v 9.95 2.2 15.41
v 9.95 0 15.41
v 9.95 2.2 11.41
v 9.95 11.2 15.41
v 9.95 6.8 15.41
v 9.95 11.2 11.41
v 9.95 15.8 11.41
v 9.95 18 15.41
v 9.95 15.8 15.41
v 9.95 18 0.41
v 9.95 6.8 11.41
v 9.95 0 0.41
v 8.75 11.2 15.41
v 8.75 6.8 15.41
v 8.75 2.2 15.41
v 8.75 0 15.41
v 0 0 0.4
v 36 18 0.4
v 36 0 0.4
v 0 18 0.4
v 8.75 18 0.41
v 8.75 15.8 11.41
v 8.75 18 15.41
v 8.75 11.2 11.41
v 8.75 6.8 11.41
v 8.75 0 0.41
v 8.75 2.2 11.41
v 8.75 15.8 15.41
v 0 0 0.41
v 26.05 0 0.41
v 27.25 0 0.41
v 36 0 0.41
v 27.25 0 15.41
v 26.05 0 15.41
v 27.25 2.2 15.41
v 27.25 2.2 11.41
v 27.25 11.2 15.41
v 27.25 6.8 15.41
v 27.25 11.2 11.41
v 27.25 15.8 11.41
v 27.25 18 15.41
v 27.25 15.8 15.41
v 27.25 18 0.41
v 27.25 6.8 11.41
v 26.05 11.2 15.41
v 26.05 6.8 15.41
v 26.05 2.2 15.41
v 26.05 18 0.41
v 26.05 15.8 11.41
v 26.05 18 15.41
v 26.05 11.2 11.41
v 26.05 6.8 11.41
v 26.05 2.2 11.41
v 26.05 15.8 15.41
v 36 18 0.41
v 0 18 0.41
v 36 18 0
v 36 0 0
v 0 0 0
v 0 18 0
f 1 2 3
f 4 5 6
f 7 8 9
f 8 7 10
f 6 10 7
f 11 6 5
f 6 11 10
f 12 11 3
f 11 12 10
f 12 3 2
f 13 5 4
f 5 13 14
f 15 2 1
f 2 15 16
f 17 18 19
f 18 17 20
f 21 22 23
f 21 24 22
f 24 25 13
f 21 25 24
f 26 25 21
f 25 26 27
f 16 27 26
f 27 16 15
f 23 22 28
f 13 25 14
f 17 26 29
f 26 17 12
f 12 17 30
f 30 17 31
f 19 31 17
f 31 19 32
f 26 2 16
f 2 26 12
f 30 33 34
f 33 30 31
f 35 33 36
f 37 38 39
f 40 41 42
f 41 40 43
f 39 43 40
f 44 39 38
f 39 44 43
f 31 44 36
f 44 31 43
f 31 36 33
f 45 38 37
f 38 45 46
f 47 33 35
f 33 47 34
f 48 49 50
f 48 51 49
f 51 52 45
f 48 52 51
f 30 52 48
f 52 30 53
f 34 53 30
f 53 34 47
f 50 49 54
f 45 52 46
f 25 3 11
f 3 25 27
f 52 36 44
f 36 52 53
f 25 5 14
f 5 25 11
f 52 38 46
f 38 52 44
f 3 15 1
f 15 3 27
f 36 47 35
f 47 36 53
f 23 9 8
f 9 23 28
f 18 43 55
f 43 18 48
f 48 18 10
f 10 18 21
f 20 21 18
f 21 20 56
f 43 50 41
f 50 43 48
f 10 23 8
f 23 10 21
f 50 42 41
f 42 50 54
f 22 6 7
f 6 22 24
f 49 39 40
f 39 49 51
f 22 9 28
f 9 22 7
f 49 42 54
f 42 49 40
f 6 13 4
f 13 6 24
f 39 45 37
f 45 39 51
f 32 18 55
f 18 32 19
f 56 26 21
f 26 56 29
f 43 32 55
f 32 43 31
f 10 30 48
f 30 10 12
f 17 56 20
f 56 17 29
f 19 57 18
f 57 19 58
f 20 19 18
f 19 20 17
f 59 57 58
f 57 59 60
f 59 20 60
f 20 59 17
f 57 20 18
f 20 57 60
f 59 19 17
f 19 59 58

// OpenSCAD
// file: ../../Base/Helper.scad
// Fischertechnik Box Foundation
// Helper functions

include <PlacementOptions.scad>

// getRotation(rotations, i)
// gets the rotation with index i, even if rotations or rotations[i] is undefined.
// If undefined, NoRotation ist returned.
// rotations = list of Rotate-constants
// i = Index of the rotation
function getRotation(rotations, i) = (is_undef(rotations) || is_undef(rotations[i])) ? NoRotation : rotations[i];
// file: ../../Base/Boxes.scad
// Fischertechnik Box Foundation
// Pre-designed Boxes

use <Constants.scad>

include <PlacementOptions.scad>

box190Width = 190;
box190Depth = 130;
box130Width = 130;
box130Depth = 95;

// Values are from an original ec3 box
topBottomDifference = 1.5;
outerHeight = 40;
innerHeight = 38.2;
baseThickness = outerHeight - innerHeight;
stackExcess = 5.7;
radius = 3.5;
wallThickness = 1.5;
tolerance = 0.2;
stackOffset = innerHeight - stackExcess;

boxUsageHeight = stackOffset;
boxWallThickness = wallThickness;
boxBaseThickness = baseThickness;
boxWebWidth = 3.0;

// getBoxWallThickness()
// Gets the wall thickness of a Fischertechnik Box
function getBoxWallThickness() = boxWallThickness;

// getBoxUsageHeight()
// Gets the usable height of a Fischertechnik box
function getBoxUsageHeight() = boxUsageHeight;

// getBoxInnerHeight()
// Gets the inner height of a Fischertechnik box, including the stack excess
function getBoxInnerHeight() = innerHeight;

// getBoxBaseThickness()
// Gets the thickness of the Fischertechnik box base.
function getBoxBaseThickness() = boxBaseThickness;

// getBoxWebWidth()
// Gets the width of a box web
function getBoxWebWidth() = boxWebWidth;

// getBox190Space()
// Gets the usable inner space of a Box 190 as an x/y-list
function getBox190Space() = [
    box190Width - 2*getBoxWallThickness() - topBottomDifference, 
    box190Depth - 2*getBoxWallThickness() - topBottomDifference ];

// BoxBase(width, depth)
// Creates an empty stackable Fischertechnik compatible box
// width = Outer width of the box (190, 130, ...)
// depth = Outer depth of the box (130, 95, ...)

module BoxBase(width, depth, height=outerHeight) {    
    thinPlate = 0.01;

    innerHeight = height - baseThickness;    
    
    module BodyPlate(width, depth) {
        translate([radius, radius])
        hull() {
            w = width-2*radius;
            d = depth-2*radius;
            cube([w, d, thinPlate]);
            cylinder(thinPlate, r=radius, $fn=getFragments());
            translate([w, 0])
                cylinder(thinPlate, r=radius, $fn=getFragments());
            translate([w, d])
                cylinder(thinPlate, r=radius, $fn=getFragments());
            translate([0, d])
                cylinder(thinPlate, r=radius, $fn=getFragments());
        }
    }
    
    module Body(tolerance=tolerance) {
        hull() {
            // Bottom with tolerance to fit into the original boxes when stacked
            translate([-wallThickness+tolerance, -wallThickness+tolerance, -baseThickness])
                BodyPlate(width-topBottomDifference-2*tolerance, depth-topBottomDifference-2*tolerance);
            
            // Top
            translate([-wallThickness-topBottomDifference/2, -wallThickness-topBottomDifference/2, innerHeight-thinPlate])
                BodyPlate(width, depth);
         }
    }

    module Cutoff() {
        hull() {
            coWidth = width - 2*wallThickness;
            coDepth = depth - 2*wallThickness;
            
            // Bottom
            BodyPlate(coWidth-topBottomDifference, coDepth-topBottomDifference);

            // Top
            translate([-topBottomDifference/2, -topBottomDifference/2, innerHeight+thinPlate]) 
                BodyPlate(coWidth, coDepth);
        }
    }
    
    difference() {        
        Body();
        Cutoff();
        stackOffset = innerHeight - stackExcess;
        translate([0, 0, stackOffset + baseThickness])
            Body(tolerance=0);
    }
}

// Creates the Fischertechnik empty box 130x190 mm and places it at position 0,0
// 190x130 are the outer sizes, the inner space is slightly smaller. Use getBox190Space() to get the inner sizes.
// The box is positioned that the usable inner space is at the 0,0,0 position. The

module Box190() {
    BoxBase(box190Width, box190Depth);
}

// Gets the usable inner space of a Box 130 as an x/y-list
function getBox130Space() = [
    box130Width - 2*getBoxWallThickness() - topBottomDifference, 
    box130Depth - 2*getBoxWallThickness() - topBottomDifference ];

// Creates the Fischertechnik empty box 95x130 mm and places it at position 0,0
// 190x130 are the outer sizes, the inner space is slightly smaller. Use getBox190Space() to get the inner sizes.
// The box is positioned that the usable inner space is at the 0,0,0 position. The

module Box130() {
    BoxBase(box130Width, box130Depth);
}

// Creates a web at the specified box walls
// corner 0 = LowerLeft, 1 = UpperLeft, 2 = UpperRight, 3 = LowerRight
// side 0 = LeftOfCorner, 1 = RightOfCorner
// distance = Distance in mm from the corner
// boxSpace = inner width and depth of the box (default: Box 190)
// webWidth = length of the web (default is 3 mms)
// webThickness = thickness of the web (default is 1 mm)

module BoxWeb(corner, side, distance, boxSpace=getBox190Space(), webWidth=getBoxWebWidth(), webThickness=1.0) {
    sink = getBoxWallThickness()/2;

    width = (corner % 2 == 0) ? 
            (side == LeftOfCorner ? webWidth : webThickness) :
            (side == LeftOfCorner ? webThickness : webWidth);

    depth = (corner % 2 == 0) ? 
            (side == RightOfCorner ? webWidth : webThickness) :
            (side == RightOfCorner ? webThickness : webWidth);
    
    xDiff = corner == LowerLeft ? 
                (side == LeftOfCorner ? -sink : distance) :
            (corner == UpperLeft ?                
                (side == LeftOfCorner ? distance : -sink) :
            (corner == UpperRight ?
                (side == LeftOfCorner ? boxSpace.x-webWidth+sink : boxSpace.x-distance-webThickness) :
                (side == LeftOfCorner ? boxSpace.x-distance-webThickness: boxSpace.x-webWidth+sink)));

    yDiff = corner == LowerLeft ? 
                (side == RightOfCorner ? -sink : distance) :
            (corner == UpperLeft ?
                (side == RightOfCorner ? boxSpace.y-distance : boxSpace.y-webWidth+sink) :
            (corner == UpperRight ?
                (side == RightOfCorner ? boxSpace.y-webWidth+sink : boxSpace.y-distance) :
                (side == RightOfCorner ? distance : -sink)));
    
    translate([xDiff, yDiff, -getExcess()])
        cube([width, depth, boxUsageHeight + 2*getExcess()]);
}
// file: ../../Base/Rotation.scad
// Fischertechnik Box Foundation
// Geometry Helpers Rotation

include <PlacementOptions.scad>

// getRotatedSpace(space, rotation=NoRotation)
// Rotates the space dependent on the specified rotation

function getRotatedSpace(space, rotation=NoRotation) = [
    (rotation == Rotate90 || rotation == Rotate270) ? space.y : space.x,
    (rotation == Rotate90 || rotation == Rotate270) ? space.x : space.y
];

// Rotates the given space around the fixed left lower corner
// space = the space the children needs as width/depth list [width,depth]
// rotation = 0 Rotate0 degrees, 1 Rotate90 degrees, 2 Rotate180 degrees, 3 Rotate270 degrees (equivalent to -90)

module RotateFix(space, rotation=NoRotation) {
    dy = (rotation == Rotate0 || rotation == Rotate270) ? 0 :
        (rotation == Rotate90) ? space.x :
        space.y;
    dx = (rotation < Rotate180) ? 0 :
        (rotation == Rotate180) ? space.x :
        space.y;
    
    translate([dx, dy, 0])
        rotate([0, 0, rotations[rotation]])
            children();
}
// file: ../../Base/Alignment.scad
// Fischertechnik Box Foundation
// Geometry Helpers Alignment

include <PlacementOptions.scad>

// getAlignedX(elementWidth, spaceWidth, align=AlignRight, offset=0)
// Gets the aligned X offset of an element with the given
// width in the given space.
// elementWidth = The width of the element to positon
// spaceWidth = The space where the element should be aligned
// align = 0 AlignLeft, 1 AlignCenter, 2 AlignRight
// offset = an optional offset from the aligned position. When
// aligned left or centered, then positive values are in X direction.
// When aligned right then positive values are in negative X direction.

function getAlignedX(elementWidth, spaceWidth, align=AlignRight, offset=0) =
    (align == AlignLeft) ?
        offset :
        ((align == AlignCenter) ?
        (spaceWidth - elementWidth)/2 + offset :
        spaceWidth - offset - elementWidth);

// getAlignedY(elementDepth, spaceDepth, align=AlignTop, offset=0)
// Gets the aligned Y offset of an element with the given
// depth in the given space.
// elementDepth = The depth of the element to positon
// spaceDepth = The space where the element should be aligned
// align = 0 AlignBottom, 1 AlignCenter, 2 AlignTop
// offset = an optional offset from the aligned position. When
// aligned bottom or centered, then positive values are in Y direction.
// When aligned top then positive values are in negative Y direction.

function getAlignedY(elementDepth, spaceDepth, align=AlignTop, offset=0) =
    (align == AlignBottom) ?
        offset :
        ((align == AlignCenter) ?
        (spaceDepth - elementDepth)/2 + offset :
        spaceDepth - offset - elementDepth);
// file: ../../Base/PlacementOptions.scad
// Fischertechnik Box Foundation
// Placement Options

// Alignment
NoAlign = 0;
AlignLeft = 1;
AlignBottom = 2;
AlignCenter = 3;
AlignRight = 4;
AlignTop = 5;

// Element rotation degree steps
rotations = [0, -90, -180, -270];

// Rotation
NoRotation = 0;
Rotate0 = 0;
Rotate90 = 1;
Rotate180 = 2;
Rotate270 = 3;

// Docking (seen from above)
NoDock = -1;
DockLeft = 0;
DockTop = 1;
DockRight = 2;
DockCorner = 2;
DockBottom = 3;

// Web corners
LowerLeft = 0;
UpperLeft = 1;
UpperRight = 2;
LowerRight = 3;

// Web position relative to corner
LeftOfCorner = 0;
RightOfCorner = 1;
// file: ../../Base/Placement.scad
// Fischertechnik Box Foundation
// Geometry Helpers Placement

use <Constants.scad>
use <Alignment.scad>
use <Rotation.scad>
use <Boxes.scad>

include <PlacementOptions.scad>

// Place(x=0, y=0, elementSpace=[0,0], alignX=AlignLeft, alignY=AlignBottom, rotation=Rotate0, boxSpace=getBox190Space())
// Places the child at the specified position
// y = Y-Position. This is a relative position when an X aligment is specified.
// x = X-Position. This is a relative position when an Y aligment is specified.
// elementSpace = space of the element to be placed [x,y]
// alignX = -1=NoAlign, 0 AlignLeft, 1 AlignCenter, 3 AlignRight (elementSpace and boxSpace required!)
// alignY = -1=NoAlign, 2 AlignBottom, 1 AlignCenter, 4 AlignTop (elementSpace and boxSpace required!)
// rotation = 0 Rotate0 0 degrees, 1 Rotate90 90 degrees, 
// 2 Rotate180 180 degrees, 3 Rotate270 270 degrees (equivalent to -90)
// boxSpace = Inner space of the box where the placement occurs [x,y] - default is Box 190x130 inner space

module Place(x=0, y=0, elementSpace=[0,0], 
  alignX=AlignLeft, alignY=AlignBottom, 
  rotation=NoRotation, boxSpace=getBox190Space()) {

    module Position(x, y, space, rotation=Rotate0) {
        translate([x, y, 0])
            RotateFix(space, rotation)
                children();
    }

    space = getRotatedSpace(elementSpace, rotation);
    alignedX = getAlignedX(space.x, boxSpace.x, alignX, x);
    alignedY = getAlignedY(space.y, boxSpace.y, alignY, y);
    Position(alignedX, alignedY, elementSpace, rotation)
        children();
}

// Center(space=getBox130Space(), elementSpace=[0,0])
// space = Space where the children is centered. For cylinder use centered=true and no elementSpace.
// elementSpace = space of the element to be centered [x,y]

module Center(space=getBox190Space(), elementSpace=[0,0]) {
    Place(elementSpace=elementSpace, boxSpace=space, alignX=AlignCenter, alignY=AlignCenter)
        children();
}

// CenterHorizontal(width=0, y=0, offset=0, space=getBox130Space())
// width = Width of the element to be placed.
// y = Y position of the element
// offset = Offset from the center position (negative will be left of the center)
// space = Space where the element is placed

module CenterHorizontal(width=0, y=0, offset=0, space=getBox190Space()) {
    Place(x=offset, y=y, elementSpace=[width, 0], boxSpace=space, alignX=AlignCenter)
        children(0);
}

// CenterVertical(depth=0, x=0, offset=0, space=getBox130Space())
// depth = Depth of the element to be placed.
// x = X position of the element
// offset = Offset from the center position (negative will be down of the center)
// space = Space where the element is placed

module CenterVertical(depth=0, x=0, offset=0, space=getBox190Space()) {
    Place(x=x, y=offset, elementSpace=[0, depth], boxSpace=space, alignY=AlignCenter)
        children(0);
}

// getIsVertical(align)
// True if the specified alignment needs a vertical orientation for a divider (AlignRight, AlignLeft)

function getIsVertical(align) = (align == AlignRight || align == AlignLeft);

// getIsHorizontal(align)
// True if the specified alignment needs a horizontal orientation for a divider (AlignTop, AlignBottom)

function getIsHorizontal(align) = (align == AlignTop || align == AlignBottom);
// file: ../../Elements/AxisClip10.scad
// Fischertechnik Box Library
// Axis for clip 10
// 31023

use <../ModelBase/Simple.scad>
use <../Base/Constants.scad>

/* [Element Parameters] */
height = 23;
clipHeight = 10;

/* [Hidden] */
width = 12;
depth = 12;
upperDiameter = 3.6;

// getAxisClip10Space()
// Gets the space of a frame for a clip 10 with spring ring (mot2)

function getAxisClip10Space() = [width, depth, height];

// AxisClip10(height, clipHeight)
// Axis for clip 10 with spring ring (mot2)
// height = Height of the complete axis (standard is 23, in mot3 its only 12)
// clipHeight = Height of the part for the clip (standard is 10, in mot3 its only 7)

module AxisClip10(height=height, clipHeight=clipHeight) {
    LeveledAxisWithSpace(height, height-clipHeight, getAxisClip10Space(), diameter=upperDiameter);
}

// Test
color("lightgray")
AxisClip10(height, clipHeight);
// file: ../../Base/Constants.scad
// Fischertechnik Box Foundation
// Constants

// Constant values necessary for multiple elements

// Base constants
dividerThickness = 1.2;
excess = 0.01;
fragments = 90;
tolerance = 0.8;

// Gets the thickness of a divider 
function getDividerThickness() = dividerThickness;

// Gets the excess that is used to merge walls into each other
function getExcess() = excess;

// Gets amount of fragments of a cylinder
function getFragments() = fragments;

// Gets the inner tolerance of a frame to each side
function getTolerance() = tolerance;


// Fischertechnik specific constants
axisDiameter = 4;
axisBottomDiameter = axisDiameter + 1;
axisTolerance = 0.2;
standardEdgeDistance = 2.5;
standardWebDistance = 11.5;
standardCornerLength = 15;
tubeWallFactor = 0.8;
smallPartsFrameHeight = 20;

// Gets axis diameter of Fischertechnik axis
function getAxisDiameter() = axisDiameter;

// Gets axis diameter tolerance (subtracted for element axis)
function getAxisTolerance() = axisTolerance;

// Gets the axis diameter for standing axis
function getStandAxisDiameter() = getAxisDiameter() - getAxisTolerance();

// Gets axis bottom diameter for thicker part at the bottom
function getAxisBottomDiameter() = axisBottomDiameter;

// gets the standard distance to the wall of the box for dockable frames with webs
function getStandardEdgeDistance() = standardEdgeDistance;

// gets the standard distance of each web to the corner of the dockable frame
function getStandardWebDistance() = standardWebDistance;

// gets the standard length of the corner walls of a dockable frame
function getStandardCornerLength() = standardCornerLength;

// gets the wall thickness of a tube.
function getTubeWallThickness() = tubeWallFactor * getDividerThickness();

// gets the frame height for docked small parts boxes.
function getSmallPartsFrameHeight() = smallPartsFrameHeight;
// file: ../../Elements/HolderSpringLeg.scad
// Fischertechnik Box Library
// Holder for Spring Leg
// 31307

use <../Base/Constants.scad>
use <../Base/Placement.scad>
use <../Base/Deployment.scad>
use <../ModelBase/Simple.scad>
use <../ModelBase/Complex.scad>

include <../Base/PlacementOptions.scad>

/* [Element Parameters] */
count = 1;
dock = false;

/* [Hidden] */
width = 36;
depth = 9;

innerWidth = 18.5;

// getHolderSpringLegSpace(count=1)
// Gets the space the Spring Leg holders need.
// count = Count of spring legs

function getHolderSpringLegSpace(count=1) = [width, depth * count];

// HolderSpringLeg(count=1, dock=false)
// Creates Spring Leg holders.
// count = Count of spring legs
// dock = true for extended holder walls into the bottom wall of the box. Rotate when placing if necessary.

module HolderSpringLeg(count=1, dock=false) {
    Space(getHolderSpringLegSpace(count));

    wallSpace = [innerWidth, depth];
    cutoffDepth = getAxisDiameter() + 0.6;
    holderDepth = depth + getExcess();
    wallVolume = [getDividerThickness(), depth, getFrameAxisHeight()];

    module Holders() {
        difference() {
            CenterHorizontal(innerWidth, space=getHolderSpringLegSpace(count))
                DeploySame(wallSpace, wallVolume)
                    Wall(wallVolume);
            cutoffVolume = [width, cutoffDepth, getAxisDiameter() + getExcess()];
            translate([0,0,getFrameAxisHeight() - getAxisDiameter()])
            CenterVertical(cutoffDepth, space=wallVolume)    
                cube(cutoffVolume);

        }
    }

    for(y = [0 : depth : (count-1) * depth])
        translate([0, y])
            Holders();

    if (dock) {
        dockVolume = [getDividerThickness(), getDividerThickness() + getExcess(), getFrameAxisHeight()];
        translate([0, -getDividerThickness()])
            CenterHorizontal(innerWidth, space=getHolderSpringLegSpace(count))
                DeploySame(wallSpace, dockVolume)
                    Wall(dockVolume);
    }    
}

// Test
color("lightgray")
HolderSpringLeg(count, dock);
// file: ../TestPrint.scad
// 3D Print Test Base

use <../Base/Constants.scad>

use <../Elements/AxisClip10.scad>

module TestPrint(elementSpace) {
    cube([elementSpace.x, elementSpace.y, 0.4]);
    translate([0,0,0.4+getExcess()]) {
        children();
    }
}

TestPrint(getAxisClip10Space())
    AxisClip10();
// main file
// 3D Print Test
// HolderSpringLeg

use <../TestPrint.scad>
use <../../Elements/HolderSpringLeg.scad>

TestPrint(getHolderSpringLegSpace(2))
    HolderSpringLeg(2);
